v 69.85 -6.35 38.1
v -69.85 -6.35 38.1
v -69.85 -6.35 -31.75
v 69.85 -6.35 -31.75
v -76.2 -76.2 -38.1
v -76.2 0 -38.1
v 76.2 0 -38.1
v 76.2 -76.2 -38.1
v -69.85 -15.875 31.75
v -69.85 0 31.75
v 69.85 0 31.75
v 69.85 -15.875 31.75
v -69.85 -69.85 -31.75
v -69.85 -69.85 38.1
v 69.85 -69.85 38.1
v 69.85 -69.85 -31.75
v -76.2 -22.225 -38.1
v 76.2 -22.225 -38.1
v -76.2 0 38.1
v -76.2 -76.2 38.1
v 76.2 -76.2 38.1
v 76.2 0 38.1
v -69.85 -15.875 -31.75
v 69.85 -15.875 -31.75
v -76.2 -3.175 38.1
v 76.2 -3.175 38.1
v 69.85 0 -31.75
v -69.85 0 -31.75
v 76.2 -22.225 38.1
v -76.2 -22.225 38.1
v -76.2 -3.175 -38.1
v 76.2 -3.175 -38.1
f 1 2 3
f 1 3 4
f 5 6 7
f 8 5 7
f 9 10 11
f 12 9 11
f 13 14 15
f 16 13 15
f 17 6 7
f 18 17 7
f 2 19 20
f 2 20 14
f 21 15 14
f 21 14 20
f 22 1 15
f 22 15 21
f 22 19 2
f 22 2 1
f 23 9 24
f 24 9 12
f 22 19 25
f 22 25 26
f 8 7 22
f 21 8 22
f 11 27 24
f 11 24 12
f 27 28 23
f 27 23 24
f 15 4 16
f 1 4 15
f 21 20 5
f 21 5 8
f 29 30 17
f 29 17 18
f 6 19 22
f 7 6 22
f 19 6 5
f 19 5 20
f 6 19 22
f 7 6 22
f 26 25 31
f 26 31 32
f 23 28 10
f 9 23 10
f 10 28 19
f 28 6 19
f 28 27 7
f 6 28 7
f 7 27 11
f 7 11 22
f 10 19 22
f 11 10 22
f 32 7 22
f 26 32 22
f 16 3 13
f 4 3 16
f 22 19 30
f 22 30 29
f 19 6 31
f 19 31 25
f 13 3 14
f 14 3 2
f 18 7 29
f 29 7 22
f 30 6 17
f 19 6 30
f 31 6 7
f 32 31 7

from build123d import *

# Parameters (mm, degrees)
F0_W     = 152.4
F0_H     = 76.2
F1_DEPTH = 76.2
F2_W     = 152.4
F2_H     = 76.2
F3_DEPTH = 22.225
F4_T     = -6.35
F5_T     = -6.35
F6_DEPTH = 3.175


with BuildPart() as f1:
    # F0 (on Front) → F1 (new body)
    with BuildSketch(Plane.XZ):
        Rectangle(F0_W, F0_H)
    extrude(amount=F1_DEPTH)

    # F4
    f4_openings = [f1.faces().sort_by_distance(p)[0] for p in [
        (0, -38.1, 38.1),
    ]]
    offset(amount=F4_T, openings=f4_openings)


with BuildPart() as f3:
    # F2 (on Front) → F3 (new body)
    with BuildSketch(Plane.XZ):
        Rectangle(F2_W, F2_H)
    extrude(amount=F3_DEPTH)

    # F5
    f5_openings = [f3.faces().sort_by_distance(p)[0] for p in [
        (0, 0, 0),
    ]]
    offset(amount=F5_T, openings=f5_openings)


with BuildPart() as f6:
    # F0 (on Front) → F6 (new body)
    with BuildSketch(Plane.XZ):
        Rectangle(F0_W, F0_H)
    extrude(amount=F6_DEPTH)


solid = Compound([f1.part, f3.part, f6.part])
